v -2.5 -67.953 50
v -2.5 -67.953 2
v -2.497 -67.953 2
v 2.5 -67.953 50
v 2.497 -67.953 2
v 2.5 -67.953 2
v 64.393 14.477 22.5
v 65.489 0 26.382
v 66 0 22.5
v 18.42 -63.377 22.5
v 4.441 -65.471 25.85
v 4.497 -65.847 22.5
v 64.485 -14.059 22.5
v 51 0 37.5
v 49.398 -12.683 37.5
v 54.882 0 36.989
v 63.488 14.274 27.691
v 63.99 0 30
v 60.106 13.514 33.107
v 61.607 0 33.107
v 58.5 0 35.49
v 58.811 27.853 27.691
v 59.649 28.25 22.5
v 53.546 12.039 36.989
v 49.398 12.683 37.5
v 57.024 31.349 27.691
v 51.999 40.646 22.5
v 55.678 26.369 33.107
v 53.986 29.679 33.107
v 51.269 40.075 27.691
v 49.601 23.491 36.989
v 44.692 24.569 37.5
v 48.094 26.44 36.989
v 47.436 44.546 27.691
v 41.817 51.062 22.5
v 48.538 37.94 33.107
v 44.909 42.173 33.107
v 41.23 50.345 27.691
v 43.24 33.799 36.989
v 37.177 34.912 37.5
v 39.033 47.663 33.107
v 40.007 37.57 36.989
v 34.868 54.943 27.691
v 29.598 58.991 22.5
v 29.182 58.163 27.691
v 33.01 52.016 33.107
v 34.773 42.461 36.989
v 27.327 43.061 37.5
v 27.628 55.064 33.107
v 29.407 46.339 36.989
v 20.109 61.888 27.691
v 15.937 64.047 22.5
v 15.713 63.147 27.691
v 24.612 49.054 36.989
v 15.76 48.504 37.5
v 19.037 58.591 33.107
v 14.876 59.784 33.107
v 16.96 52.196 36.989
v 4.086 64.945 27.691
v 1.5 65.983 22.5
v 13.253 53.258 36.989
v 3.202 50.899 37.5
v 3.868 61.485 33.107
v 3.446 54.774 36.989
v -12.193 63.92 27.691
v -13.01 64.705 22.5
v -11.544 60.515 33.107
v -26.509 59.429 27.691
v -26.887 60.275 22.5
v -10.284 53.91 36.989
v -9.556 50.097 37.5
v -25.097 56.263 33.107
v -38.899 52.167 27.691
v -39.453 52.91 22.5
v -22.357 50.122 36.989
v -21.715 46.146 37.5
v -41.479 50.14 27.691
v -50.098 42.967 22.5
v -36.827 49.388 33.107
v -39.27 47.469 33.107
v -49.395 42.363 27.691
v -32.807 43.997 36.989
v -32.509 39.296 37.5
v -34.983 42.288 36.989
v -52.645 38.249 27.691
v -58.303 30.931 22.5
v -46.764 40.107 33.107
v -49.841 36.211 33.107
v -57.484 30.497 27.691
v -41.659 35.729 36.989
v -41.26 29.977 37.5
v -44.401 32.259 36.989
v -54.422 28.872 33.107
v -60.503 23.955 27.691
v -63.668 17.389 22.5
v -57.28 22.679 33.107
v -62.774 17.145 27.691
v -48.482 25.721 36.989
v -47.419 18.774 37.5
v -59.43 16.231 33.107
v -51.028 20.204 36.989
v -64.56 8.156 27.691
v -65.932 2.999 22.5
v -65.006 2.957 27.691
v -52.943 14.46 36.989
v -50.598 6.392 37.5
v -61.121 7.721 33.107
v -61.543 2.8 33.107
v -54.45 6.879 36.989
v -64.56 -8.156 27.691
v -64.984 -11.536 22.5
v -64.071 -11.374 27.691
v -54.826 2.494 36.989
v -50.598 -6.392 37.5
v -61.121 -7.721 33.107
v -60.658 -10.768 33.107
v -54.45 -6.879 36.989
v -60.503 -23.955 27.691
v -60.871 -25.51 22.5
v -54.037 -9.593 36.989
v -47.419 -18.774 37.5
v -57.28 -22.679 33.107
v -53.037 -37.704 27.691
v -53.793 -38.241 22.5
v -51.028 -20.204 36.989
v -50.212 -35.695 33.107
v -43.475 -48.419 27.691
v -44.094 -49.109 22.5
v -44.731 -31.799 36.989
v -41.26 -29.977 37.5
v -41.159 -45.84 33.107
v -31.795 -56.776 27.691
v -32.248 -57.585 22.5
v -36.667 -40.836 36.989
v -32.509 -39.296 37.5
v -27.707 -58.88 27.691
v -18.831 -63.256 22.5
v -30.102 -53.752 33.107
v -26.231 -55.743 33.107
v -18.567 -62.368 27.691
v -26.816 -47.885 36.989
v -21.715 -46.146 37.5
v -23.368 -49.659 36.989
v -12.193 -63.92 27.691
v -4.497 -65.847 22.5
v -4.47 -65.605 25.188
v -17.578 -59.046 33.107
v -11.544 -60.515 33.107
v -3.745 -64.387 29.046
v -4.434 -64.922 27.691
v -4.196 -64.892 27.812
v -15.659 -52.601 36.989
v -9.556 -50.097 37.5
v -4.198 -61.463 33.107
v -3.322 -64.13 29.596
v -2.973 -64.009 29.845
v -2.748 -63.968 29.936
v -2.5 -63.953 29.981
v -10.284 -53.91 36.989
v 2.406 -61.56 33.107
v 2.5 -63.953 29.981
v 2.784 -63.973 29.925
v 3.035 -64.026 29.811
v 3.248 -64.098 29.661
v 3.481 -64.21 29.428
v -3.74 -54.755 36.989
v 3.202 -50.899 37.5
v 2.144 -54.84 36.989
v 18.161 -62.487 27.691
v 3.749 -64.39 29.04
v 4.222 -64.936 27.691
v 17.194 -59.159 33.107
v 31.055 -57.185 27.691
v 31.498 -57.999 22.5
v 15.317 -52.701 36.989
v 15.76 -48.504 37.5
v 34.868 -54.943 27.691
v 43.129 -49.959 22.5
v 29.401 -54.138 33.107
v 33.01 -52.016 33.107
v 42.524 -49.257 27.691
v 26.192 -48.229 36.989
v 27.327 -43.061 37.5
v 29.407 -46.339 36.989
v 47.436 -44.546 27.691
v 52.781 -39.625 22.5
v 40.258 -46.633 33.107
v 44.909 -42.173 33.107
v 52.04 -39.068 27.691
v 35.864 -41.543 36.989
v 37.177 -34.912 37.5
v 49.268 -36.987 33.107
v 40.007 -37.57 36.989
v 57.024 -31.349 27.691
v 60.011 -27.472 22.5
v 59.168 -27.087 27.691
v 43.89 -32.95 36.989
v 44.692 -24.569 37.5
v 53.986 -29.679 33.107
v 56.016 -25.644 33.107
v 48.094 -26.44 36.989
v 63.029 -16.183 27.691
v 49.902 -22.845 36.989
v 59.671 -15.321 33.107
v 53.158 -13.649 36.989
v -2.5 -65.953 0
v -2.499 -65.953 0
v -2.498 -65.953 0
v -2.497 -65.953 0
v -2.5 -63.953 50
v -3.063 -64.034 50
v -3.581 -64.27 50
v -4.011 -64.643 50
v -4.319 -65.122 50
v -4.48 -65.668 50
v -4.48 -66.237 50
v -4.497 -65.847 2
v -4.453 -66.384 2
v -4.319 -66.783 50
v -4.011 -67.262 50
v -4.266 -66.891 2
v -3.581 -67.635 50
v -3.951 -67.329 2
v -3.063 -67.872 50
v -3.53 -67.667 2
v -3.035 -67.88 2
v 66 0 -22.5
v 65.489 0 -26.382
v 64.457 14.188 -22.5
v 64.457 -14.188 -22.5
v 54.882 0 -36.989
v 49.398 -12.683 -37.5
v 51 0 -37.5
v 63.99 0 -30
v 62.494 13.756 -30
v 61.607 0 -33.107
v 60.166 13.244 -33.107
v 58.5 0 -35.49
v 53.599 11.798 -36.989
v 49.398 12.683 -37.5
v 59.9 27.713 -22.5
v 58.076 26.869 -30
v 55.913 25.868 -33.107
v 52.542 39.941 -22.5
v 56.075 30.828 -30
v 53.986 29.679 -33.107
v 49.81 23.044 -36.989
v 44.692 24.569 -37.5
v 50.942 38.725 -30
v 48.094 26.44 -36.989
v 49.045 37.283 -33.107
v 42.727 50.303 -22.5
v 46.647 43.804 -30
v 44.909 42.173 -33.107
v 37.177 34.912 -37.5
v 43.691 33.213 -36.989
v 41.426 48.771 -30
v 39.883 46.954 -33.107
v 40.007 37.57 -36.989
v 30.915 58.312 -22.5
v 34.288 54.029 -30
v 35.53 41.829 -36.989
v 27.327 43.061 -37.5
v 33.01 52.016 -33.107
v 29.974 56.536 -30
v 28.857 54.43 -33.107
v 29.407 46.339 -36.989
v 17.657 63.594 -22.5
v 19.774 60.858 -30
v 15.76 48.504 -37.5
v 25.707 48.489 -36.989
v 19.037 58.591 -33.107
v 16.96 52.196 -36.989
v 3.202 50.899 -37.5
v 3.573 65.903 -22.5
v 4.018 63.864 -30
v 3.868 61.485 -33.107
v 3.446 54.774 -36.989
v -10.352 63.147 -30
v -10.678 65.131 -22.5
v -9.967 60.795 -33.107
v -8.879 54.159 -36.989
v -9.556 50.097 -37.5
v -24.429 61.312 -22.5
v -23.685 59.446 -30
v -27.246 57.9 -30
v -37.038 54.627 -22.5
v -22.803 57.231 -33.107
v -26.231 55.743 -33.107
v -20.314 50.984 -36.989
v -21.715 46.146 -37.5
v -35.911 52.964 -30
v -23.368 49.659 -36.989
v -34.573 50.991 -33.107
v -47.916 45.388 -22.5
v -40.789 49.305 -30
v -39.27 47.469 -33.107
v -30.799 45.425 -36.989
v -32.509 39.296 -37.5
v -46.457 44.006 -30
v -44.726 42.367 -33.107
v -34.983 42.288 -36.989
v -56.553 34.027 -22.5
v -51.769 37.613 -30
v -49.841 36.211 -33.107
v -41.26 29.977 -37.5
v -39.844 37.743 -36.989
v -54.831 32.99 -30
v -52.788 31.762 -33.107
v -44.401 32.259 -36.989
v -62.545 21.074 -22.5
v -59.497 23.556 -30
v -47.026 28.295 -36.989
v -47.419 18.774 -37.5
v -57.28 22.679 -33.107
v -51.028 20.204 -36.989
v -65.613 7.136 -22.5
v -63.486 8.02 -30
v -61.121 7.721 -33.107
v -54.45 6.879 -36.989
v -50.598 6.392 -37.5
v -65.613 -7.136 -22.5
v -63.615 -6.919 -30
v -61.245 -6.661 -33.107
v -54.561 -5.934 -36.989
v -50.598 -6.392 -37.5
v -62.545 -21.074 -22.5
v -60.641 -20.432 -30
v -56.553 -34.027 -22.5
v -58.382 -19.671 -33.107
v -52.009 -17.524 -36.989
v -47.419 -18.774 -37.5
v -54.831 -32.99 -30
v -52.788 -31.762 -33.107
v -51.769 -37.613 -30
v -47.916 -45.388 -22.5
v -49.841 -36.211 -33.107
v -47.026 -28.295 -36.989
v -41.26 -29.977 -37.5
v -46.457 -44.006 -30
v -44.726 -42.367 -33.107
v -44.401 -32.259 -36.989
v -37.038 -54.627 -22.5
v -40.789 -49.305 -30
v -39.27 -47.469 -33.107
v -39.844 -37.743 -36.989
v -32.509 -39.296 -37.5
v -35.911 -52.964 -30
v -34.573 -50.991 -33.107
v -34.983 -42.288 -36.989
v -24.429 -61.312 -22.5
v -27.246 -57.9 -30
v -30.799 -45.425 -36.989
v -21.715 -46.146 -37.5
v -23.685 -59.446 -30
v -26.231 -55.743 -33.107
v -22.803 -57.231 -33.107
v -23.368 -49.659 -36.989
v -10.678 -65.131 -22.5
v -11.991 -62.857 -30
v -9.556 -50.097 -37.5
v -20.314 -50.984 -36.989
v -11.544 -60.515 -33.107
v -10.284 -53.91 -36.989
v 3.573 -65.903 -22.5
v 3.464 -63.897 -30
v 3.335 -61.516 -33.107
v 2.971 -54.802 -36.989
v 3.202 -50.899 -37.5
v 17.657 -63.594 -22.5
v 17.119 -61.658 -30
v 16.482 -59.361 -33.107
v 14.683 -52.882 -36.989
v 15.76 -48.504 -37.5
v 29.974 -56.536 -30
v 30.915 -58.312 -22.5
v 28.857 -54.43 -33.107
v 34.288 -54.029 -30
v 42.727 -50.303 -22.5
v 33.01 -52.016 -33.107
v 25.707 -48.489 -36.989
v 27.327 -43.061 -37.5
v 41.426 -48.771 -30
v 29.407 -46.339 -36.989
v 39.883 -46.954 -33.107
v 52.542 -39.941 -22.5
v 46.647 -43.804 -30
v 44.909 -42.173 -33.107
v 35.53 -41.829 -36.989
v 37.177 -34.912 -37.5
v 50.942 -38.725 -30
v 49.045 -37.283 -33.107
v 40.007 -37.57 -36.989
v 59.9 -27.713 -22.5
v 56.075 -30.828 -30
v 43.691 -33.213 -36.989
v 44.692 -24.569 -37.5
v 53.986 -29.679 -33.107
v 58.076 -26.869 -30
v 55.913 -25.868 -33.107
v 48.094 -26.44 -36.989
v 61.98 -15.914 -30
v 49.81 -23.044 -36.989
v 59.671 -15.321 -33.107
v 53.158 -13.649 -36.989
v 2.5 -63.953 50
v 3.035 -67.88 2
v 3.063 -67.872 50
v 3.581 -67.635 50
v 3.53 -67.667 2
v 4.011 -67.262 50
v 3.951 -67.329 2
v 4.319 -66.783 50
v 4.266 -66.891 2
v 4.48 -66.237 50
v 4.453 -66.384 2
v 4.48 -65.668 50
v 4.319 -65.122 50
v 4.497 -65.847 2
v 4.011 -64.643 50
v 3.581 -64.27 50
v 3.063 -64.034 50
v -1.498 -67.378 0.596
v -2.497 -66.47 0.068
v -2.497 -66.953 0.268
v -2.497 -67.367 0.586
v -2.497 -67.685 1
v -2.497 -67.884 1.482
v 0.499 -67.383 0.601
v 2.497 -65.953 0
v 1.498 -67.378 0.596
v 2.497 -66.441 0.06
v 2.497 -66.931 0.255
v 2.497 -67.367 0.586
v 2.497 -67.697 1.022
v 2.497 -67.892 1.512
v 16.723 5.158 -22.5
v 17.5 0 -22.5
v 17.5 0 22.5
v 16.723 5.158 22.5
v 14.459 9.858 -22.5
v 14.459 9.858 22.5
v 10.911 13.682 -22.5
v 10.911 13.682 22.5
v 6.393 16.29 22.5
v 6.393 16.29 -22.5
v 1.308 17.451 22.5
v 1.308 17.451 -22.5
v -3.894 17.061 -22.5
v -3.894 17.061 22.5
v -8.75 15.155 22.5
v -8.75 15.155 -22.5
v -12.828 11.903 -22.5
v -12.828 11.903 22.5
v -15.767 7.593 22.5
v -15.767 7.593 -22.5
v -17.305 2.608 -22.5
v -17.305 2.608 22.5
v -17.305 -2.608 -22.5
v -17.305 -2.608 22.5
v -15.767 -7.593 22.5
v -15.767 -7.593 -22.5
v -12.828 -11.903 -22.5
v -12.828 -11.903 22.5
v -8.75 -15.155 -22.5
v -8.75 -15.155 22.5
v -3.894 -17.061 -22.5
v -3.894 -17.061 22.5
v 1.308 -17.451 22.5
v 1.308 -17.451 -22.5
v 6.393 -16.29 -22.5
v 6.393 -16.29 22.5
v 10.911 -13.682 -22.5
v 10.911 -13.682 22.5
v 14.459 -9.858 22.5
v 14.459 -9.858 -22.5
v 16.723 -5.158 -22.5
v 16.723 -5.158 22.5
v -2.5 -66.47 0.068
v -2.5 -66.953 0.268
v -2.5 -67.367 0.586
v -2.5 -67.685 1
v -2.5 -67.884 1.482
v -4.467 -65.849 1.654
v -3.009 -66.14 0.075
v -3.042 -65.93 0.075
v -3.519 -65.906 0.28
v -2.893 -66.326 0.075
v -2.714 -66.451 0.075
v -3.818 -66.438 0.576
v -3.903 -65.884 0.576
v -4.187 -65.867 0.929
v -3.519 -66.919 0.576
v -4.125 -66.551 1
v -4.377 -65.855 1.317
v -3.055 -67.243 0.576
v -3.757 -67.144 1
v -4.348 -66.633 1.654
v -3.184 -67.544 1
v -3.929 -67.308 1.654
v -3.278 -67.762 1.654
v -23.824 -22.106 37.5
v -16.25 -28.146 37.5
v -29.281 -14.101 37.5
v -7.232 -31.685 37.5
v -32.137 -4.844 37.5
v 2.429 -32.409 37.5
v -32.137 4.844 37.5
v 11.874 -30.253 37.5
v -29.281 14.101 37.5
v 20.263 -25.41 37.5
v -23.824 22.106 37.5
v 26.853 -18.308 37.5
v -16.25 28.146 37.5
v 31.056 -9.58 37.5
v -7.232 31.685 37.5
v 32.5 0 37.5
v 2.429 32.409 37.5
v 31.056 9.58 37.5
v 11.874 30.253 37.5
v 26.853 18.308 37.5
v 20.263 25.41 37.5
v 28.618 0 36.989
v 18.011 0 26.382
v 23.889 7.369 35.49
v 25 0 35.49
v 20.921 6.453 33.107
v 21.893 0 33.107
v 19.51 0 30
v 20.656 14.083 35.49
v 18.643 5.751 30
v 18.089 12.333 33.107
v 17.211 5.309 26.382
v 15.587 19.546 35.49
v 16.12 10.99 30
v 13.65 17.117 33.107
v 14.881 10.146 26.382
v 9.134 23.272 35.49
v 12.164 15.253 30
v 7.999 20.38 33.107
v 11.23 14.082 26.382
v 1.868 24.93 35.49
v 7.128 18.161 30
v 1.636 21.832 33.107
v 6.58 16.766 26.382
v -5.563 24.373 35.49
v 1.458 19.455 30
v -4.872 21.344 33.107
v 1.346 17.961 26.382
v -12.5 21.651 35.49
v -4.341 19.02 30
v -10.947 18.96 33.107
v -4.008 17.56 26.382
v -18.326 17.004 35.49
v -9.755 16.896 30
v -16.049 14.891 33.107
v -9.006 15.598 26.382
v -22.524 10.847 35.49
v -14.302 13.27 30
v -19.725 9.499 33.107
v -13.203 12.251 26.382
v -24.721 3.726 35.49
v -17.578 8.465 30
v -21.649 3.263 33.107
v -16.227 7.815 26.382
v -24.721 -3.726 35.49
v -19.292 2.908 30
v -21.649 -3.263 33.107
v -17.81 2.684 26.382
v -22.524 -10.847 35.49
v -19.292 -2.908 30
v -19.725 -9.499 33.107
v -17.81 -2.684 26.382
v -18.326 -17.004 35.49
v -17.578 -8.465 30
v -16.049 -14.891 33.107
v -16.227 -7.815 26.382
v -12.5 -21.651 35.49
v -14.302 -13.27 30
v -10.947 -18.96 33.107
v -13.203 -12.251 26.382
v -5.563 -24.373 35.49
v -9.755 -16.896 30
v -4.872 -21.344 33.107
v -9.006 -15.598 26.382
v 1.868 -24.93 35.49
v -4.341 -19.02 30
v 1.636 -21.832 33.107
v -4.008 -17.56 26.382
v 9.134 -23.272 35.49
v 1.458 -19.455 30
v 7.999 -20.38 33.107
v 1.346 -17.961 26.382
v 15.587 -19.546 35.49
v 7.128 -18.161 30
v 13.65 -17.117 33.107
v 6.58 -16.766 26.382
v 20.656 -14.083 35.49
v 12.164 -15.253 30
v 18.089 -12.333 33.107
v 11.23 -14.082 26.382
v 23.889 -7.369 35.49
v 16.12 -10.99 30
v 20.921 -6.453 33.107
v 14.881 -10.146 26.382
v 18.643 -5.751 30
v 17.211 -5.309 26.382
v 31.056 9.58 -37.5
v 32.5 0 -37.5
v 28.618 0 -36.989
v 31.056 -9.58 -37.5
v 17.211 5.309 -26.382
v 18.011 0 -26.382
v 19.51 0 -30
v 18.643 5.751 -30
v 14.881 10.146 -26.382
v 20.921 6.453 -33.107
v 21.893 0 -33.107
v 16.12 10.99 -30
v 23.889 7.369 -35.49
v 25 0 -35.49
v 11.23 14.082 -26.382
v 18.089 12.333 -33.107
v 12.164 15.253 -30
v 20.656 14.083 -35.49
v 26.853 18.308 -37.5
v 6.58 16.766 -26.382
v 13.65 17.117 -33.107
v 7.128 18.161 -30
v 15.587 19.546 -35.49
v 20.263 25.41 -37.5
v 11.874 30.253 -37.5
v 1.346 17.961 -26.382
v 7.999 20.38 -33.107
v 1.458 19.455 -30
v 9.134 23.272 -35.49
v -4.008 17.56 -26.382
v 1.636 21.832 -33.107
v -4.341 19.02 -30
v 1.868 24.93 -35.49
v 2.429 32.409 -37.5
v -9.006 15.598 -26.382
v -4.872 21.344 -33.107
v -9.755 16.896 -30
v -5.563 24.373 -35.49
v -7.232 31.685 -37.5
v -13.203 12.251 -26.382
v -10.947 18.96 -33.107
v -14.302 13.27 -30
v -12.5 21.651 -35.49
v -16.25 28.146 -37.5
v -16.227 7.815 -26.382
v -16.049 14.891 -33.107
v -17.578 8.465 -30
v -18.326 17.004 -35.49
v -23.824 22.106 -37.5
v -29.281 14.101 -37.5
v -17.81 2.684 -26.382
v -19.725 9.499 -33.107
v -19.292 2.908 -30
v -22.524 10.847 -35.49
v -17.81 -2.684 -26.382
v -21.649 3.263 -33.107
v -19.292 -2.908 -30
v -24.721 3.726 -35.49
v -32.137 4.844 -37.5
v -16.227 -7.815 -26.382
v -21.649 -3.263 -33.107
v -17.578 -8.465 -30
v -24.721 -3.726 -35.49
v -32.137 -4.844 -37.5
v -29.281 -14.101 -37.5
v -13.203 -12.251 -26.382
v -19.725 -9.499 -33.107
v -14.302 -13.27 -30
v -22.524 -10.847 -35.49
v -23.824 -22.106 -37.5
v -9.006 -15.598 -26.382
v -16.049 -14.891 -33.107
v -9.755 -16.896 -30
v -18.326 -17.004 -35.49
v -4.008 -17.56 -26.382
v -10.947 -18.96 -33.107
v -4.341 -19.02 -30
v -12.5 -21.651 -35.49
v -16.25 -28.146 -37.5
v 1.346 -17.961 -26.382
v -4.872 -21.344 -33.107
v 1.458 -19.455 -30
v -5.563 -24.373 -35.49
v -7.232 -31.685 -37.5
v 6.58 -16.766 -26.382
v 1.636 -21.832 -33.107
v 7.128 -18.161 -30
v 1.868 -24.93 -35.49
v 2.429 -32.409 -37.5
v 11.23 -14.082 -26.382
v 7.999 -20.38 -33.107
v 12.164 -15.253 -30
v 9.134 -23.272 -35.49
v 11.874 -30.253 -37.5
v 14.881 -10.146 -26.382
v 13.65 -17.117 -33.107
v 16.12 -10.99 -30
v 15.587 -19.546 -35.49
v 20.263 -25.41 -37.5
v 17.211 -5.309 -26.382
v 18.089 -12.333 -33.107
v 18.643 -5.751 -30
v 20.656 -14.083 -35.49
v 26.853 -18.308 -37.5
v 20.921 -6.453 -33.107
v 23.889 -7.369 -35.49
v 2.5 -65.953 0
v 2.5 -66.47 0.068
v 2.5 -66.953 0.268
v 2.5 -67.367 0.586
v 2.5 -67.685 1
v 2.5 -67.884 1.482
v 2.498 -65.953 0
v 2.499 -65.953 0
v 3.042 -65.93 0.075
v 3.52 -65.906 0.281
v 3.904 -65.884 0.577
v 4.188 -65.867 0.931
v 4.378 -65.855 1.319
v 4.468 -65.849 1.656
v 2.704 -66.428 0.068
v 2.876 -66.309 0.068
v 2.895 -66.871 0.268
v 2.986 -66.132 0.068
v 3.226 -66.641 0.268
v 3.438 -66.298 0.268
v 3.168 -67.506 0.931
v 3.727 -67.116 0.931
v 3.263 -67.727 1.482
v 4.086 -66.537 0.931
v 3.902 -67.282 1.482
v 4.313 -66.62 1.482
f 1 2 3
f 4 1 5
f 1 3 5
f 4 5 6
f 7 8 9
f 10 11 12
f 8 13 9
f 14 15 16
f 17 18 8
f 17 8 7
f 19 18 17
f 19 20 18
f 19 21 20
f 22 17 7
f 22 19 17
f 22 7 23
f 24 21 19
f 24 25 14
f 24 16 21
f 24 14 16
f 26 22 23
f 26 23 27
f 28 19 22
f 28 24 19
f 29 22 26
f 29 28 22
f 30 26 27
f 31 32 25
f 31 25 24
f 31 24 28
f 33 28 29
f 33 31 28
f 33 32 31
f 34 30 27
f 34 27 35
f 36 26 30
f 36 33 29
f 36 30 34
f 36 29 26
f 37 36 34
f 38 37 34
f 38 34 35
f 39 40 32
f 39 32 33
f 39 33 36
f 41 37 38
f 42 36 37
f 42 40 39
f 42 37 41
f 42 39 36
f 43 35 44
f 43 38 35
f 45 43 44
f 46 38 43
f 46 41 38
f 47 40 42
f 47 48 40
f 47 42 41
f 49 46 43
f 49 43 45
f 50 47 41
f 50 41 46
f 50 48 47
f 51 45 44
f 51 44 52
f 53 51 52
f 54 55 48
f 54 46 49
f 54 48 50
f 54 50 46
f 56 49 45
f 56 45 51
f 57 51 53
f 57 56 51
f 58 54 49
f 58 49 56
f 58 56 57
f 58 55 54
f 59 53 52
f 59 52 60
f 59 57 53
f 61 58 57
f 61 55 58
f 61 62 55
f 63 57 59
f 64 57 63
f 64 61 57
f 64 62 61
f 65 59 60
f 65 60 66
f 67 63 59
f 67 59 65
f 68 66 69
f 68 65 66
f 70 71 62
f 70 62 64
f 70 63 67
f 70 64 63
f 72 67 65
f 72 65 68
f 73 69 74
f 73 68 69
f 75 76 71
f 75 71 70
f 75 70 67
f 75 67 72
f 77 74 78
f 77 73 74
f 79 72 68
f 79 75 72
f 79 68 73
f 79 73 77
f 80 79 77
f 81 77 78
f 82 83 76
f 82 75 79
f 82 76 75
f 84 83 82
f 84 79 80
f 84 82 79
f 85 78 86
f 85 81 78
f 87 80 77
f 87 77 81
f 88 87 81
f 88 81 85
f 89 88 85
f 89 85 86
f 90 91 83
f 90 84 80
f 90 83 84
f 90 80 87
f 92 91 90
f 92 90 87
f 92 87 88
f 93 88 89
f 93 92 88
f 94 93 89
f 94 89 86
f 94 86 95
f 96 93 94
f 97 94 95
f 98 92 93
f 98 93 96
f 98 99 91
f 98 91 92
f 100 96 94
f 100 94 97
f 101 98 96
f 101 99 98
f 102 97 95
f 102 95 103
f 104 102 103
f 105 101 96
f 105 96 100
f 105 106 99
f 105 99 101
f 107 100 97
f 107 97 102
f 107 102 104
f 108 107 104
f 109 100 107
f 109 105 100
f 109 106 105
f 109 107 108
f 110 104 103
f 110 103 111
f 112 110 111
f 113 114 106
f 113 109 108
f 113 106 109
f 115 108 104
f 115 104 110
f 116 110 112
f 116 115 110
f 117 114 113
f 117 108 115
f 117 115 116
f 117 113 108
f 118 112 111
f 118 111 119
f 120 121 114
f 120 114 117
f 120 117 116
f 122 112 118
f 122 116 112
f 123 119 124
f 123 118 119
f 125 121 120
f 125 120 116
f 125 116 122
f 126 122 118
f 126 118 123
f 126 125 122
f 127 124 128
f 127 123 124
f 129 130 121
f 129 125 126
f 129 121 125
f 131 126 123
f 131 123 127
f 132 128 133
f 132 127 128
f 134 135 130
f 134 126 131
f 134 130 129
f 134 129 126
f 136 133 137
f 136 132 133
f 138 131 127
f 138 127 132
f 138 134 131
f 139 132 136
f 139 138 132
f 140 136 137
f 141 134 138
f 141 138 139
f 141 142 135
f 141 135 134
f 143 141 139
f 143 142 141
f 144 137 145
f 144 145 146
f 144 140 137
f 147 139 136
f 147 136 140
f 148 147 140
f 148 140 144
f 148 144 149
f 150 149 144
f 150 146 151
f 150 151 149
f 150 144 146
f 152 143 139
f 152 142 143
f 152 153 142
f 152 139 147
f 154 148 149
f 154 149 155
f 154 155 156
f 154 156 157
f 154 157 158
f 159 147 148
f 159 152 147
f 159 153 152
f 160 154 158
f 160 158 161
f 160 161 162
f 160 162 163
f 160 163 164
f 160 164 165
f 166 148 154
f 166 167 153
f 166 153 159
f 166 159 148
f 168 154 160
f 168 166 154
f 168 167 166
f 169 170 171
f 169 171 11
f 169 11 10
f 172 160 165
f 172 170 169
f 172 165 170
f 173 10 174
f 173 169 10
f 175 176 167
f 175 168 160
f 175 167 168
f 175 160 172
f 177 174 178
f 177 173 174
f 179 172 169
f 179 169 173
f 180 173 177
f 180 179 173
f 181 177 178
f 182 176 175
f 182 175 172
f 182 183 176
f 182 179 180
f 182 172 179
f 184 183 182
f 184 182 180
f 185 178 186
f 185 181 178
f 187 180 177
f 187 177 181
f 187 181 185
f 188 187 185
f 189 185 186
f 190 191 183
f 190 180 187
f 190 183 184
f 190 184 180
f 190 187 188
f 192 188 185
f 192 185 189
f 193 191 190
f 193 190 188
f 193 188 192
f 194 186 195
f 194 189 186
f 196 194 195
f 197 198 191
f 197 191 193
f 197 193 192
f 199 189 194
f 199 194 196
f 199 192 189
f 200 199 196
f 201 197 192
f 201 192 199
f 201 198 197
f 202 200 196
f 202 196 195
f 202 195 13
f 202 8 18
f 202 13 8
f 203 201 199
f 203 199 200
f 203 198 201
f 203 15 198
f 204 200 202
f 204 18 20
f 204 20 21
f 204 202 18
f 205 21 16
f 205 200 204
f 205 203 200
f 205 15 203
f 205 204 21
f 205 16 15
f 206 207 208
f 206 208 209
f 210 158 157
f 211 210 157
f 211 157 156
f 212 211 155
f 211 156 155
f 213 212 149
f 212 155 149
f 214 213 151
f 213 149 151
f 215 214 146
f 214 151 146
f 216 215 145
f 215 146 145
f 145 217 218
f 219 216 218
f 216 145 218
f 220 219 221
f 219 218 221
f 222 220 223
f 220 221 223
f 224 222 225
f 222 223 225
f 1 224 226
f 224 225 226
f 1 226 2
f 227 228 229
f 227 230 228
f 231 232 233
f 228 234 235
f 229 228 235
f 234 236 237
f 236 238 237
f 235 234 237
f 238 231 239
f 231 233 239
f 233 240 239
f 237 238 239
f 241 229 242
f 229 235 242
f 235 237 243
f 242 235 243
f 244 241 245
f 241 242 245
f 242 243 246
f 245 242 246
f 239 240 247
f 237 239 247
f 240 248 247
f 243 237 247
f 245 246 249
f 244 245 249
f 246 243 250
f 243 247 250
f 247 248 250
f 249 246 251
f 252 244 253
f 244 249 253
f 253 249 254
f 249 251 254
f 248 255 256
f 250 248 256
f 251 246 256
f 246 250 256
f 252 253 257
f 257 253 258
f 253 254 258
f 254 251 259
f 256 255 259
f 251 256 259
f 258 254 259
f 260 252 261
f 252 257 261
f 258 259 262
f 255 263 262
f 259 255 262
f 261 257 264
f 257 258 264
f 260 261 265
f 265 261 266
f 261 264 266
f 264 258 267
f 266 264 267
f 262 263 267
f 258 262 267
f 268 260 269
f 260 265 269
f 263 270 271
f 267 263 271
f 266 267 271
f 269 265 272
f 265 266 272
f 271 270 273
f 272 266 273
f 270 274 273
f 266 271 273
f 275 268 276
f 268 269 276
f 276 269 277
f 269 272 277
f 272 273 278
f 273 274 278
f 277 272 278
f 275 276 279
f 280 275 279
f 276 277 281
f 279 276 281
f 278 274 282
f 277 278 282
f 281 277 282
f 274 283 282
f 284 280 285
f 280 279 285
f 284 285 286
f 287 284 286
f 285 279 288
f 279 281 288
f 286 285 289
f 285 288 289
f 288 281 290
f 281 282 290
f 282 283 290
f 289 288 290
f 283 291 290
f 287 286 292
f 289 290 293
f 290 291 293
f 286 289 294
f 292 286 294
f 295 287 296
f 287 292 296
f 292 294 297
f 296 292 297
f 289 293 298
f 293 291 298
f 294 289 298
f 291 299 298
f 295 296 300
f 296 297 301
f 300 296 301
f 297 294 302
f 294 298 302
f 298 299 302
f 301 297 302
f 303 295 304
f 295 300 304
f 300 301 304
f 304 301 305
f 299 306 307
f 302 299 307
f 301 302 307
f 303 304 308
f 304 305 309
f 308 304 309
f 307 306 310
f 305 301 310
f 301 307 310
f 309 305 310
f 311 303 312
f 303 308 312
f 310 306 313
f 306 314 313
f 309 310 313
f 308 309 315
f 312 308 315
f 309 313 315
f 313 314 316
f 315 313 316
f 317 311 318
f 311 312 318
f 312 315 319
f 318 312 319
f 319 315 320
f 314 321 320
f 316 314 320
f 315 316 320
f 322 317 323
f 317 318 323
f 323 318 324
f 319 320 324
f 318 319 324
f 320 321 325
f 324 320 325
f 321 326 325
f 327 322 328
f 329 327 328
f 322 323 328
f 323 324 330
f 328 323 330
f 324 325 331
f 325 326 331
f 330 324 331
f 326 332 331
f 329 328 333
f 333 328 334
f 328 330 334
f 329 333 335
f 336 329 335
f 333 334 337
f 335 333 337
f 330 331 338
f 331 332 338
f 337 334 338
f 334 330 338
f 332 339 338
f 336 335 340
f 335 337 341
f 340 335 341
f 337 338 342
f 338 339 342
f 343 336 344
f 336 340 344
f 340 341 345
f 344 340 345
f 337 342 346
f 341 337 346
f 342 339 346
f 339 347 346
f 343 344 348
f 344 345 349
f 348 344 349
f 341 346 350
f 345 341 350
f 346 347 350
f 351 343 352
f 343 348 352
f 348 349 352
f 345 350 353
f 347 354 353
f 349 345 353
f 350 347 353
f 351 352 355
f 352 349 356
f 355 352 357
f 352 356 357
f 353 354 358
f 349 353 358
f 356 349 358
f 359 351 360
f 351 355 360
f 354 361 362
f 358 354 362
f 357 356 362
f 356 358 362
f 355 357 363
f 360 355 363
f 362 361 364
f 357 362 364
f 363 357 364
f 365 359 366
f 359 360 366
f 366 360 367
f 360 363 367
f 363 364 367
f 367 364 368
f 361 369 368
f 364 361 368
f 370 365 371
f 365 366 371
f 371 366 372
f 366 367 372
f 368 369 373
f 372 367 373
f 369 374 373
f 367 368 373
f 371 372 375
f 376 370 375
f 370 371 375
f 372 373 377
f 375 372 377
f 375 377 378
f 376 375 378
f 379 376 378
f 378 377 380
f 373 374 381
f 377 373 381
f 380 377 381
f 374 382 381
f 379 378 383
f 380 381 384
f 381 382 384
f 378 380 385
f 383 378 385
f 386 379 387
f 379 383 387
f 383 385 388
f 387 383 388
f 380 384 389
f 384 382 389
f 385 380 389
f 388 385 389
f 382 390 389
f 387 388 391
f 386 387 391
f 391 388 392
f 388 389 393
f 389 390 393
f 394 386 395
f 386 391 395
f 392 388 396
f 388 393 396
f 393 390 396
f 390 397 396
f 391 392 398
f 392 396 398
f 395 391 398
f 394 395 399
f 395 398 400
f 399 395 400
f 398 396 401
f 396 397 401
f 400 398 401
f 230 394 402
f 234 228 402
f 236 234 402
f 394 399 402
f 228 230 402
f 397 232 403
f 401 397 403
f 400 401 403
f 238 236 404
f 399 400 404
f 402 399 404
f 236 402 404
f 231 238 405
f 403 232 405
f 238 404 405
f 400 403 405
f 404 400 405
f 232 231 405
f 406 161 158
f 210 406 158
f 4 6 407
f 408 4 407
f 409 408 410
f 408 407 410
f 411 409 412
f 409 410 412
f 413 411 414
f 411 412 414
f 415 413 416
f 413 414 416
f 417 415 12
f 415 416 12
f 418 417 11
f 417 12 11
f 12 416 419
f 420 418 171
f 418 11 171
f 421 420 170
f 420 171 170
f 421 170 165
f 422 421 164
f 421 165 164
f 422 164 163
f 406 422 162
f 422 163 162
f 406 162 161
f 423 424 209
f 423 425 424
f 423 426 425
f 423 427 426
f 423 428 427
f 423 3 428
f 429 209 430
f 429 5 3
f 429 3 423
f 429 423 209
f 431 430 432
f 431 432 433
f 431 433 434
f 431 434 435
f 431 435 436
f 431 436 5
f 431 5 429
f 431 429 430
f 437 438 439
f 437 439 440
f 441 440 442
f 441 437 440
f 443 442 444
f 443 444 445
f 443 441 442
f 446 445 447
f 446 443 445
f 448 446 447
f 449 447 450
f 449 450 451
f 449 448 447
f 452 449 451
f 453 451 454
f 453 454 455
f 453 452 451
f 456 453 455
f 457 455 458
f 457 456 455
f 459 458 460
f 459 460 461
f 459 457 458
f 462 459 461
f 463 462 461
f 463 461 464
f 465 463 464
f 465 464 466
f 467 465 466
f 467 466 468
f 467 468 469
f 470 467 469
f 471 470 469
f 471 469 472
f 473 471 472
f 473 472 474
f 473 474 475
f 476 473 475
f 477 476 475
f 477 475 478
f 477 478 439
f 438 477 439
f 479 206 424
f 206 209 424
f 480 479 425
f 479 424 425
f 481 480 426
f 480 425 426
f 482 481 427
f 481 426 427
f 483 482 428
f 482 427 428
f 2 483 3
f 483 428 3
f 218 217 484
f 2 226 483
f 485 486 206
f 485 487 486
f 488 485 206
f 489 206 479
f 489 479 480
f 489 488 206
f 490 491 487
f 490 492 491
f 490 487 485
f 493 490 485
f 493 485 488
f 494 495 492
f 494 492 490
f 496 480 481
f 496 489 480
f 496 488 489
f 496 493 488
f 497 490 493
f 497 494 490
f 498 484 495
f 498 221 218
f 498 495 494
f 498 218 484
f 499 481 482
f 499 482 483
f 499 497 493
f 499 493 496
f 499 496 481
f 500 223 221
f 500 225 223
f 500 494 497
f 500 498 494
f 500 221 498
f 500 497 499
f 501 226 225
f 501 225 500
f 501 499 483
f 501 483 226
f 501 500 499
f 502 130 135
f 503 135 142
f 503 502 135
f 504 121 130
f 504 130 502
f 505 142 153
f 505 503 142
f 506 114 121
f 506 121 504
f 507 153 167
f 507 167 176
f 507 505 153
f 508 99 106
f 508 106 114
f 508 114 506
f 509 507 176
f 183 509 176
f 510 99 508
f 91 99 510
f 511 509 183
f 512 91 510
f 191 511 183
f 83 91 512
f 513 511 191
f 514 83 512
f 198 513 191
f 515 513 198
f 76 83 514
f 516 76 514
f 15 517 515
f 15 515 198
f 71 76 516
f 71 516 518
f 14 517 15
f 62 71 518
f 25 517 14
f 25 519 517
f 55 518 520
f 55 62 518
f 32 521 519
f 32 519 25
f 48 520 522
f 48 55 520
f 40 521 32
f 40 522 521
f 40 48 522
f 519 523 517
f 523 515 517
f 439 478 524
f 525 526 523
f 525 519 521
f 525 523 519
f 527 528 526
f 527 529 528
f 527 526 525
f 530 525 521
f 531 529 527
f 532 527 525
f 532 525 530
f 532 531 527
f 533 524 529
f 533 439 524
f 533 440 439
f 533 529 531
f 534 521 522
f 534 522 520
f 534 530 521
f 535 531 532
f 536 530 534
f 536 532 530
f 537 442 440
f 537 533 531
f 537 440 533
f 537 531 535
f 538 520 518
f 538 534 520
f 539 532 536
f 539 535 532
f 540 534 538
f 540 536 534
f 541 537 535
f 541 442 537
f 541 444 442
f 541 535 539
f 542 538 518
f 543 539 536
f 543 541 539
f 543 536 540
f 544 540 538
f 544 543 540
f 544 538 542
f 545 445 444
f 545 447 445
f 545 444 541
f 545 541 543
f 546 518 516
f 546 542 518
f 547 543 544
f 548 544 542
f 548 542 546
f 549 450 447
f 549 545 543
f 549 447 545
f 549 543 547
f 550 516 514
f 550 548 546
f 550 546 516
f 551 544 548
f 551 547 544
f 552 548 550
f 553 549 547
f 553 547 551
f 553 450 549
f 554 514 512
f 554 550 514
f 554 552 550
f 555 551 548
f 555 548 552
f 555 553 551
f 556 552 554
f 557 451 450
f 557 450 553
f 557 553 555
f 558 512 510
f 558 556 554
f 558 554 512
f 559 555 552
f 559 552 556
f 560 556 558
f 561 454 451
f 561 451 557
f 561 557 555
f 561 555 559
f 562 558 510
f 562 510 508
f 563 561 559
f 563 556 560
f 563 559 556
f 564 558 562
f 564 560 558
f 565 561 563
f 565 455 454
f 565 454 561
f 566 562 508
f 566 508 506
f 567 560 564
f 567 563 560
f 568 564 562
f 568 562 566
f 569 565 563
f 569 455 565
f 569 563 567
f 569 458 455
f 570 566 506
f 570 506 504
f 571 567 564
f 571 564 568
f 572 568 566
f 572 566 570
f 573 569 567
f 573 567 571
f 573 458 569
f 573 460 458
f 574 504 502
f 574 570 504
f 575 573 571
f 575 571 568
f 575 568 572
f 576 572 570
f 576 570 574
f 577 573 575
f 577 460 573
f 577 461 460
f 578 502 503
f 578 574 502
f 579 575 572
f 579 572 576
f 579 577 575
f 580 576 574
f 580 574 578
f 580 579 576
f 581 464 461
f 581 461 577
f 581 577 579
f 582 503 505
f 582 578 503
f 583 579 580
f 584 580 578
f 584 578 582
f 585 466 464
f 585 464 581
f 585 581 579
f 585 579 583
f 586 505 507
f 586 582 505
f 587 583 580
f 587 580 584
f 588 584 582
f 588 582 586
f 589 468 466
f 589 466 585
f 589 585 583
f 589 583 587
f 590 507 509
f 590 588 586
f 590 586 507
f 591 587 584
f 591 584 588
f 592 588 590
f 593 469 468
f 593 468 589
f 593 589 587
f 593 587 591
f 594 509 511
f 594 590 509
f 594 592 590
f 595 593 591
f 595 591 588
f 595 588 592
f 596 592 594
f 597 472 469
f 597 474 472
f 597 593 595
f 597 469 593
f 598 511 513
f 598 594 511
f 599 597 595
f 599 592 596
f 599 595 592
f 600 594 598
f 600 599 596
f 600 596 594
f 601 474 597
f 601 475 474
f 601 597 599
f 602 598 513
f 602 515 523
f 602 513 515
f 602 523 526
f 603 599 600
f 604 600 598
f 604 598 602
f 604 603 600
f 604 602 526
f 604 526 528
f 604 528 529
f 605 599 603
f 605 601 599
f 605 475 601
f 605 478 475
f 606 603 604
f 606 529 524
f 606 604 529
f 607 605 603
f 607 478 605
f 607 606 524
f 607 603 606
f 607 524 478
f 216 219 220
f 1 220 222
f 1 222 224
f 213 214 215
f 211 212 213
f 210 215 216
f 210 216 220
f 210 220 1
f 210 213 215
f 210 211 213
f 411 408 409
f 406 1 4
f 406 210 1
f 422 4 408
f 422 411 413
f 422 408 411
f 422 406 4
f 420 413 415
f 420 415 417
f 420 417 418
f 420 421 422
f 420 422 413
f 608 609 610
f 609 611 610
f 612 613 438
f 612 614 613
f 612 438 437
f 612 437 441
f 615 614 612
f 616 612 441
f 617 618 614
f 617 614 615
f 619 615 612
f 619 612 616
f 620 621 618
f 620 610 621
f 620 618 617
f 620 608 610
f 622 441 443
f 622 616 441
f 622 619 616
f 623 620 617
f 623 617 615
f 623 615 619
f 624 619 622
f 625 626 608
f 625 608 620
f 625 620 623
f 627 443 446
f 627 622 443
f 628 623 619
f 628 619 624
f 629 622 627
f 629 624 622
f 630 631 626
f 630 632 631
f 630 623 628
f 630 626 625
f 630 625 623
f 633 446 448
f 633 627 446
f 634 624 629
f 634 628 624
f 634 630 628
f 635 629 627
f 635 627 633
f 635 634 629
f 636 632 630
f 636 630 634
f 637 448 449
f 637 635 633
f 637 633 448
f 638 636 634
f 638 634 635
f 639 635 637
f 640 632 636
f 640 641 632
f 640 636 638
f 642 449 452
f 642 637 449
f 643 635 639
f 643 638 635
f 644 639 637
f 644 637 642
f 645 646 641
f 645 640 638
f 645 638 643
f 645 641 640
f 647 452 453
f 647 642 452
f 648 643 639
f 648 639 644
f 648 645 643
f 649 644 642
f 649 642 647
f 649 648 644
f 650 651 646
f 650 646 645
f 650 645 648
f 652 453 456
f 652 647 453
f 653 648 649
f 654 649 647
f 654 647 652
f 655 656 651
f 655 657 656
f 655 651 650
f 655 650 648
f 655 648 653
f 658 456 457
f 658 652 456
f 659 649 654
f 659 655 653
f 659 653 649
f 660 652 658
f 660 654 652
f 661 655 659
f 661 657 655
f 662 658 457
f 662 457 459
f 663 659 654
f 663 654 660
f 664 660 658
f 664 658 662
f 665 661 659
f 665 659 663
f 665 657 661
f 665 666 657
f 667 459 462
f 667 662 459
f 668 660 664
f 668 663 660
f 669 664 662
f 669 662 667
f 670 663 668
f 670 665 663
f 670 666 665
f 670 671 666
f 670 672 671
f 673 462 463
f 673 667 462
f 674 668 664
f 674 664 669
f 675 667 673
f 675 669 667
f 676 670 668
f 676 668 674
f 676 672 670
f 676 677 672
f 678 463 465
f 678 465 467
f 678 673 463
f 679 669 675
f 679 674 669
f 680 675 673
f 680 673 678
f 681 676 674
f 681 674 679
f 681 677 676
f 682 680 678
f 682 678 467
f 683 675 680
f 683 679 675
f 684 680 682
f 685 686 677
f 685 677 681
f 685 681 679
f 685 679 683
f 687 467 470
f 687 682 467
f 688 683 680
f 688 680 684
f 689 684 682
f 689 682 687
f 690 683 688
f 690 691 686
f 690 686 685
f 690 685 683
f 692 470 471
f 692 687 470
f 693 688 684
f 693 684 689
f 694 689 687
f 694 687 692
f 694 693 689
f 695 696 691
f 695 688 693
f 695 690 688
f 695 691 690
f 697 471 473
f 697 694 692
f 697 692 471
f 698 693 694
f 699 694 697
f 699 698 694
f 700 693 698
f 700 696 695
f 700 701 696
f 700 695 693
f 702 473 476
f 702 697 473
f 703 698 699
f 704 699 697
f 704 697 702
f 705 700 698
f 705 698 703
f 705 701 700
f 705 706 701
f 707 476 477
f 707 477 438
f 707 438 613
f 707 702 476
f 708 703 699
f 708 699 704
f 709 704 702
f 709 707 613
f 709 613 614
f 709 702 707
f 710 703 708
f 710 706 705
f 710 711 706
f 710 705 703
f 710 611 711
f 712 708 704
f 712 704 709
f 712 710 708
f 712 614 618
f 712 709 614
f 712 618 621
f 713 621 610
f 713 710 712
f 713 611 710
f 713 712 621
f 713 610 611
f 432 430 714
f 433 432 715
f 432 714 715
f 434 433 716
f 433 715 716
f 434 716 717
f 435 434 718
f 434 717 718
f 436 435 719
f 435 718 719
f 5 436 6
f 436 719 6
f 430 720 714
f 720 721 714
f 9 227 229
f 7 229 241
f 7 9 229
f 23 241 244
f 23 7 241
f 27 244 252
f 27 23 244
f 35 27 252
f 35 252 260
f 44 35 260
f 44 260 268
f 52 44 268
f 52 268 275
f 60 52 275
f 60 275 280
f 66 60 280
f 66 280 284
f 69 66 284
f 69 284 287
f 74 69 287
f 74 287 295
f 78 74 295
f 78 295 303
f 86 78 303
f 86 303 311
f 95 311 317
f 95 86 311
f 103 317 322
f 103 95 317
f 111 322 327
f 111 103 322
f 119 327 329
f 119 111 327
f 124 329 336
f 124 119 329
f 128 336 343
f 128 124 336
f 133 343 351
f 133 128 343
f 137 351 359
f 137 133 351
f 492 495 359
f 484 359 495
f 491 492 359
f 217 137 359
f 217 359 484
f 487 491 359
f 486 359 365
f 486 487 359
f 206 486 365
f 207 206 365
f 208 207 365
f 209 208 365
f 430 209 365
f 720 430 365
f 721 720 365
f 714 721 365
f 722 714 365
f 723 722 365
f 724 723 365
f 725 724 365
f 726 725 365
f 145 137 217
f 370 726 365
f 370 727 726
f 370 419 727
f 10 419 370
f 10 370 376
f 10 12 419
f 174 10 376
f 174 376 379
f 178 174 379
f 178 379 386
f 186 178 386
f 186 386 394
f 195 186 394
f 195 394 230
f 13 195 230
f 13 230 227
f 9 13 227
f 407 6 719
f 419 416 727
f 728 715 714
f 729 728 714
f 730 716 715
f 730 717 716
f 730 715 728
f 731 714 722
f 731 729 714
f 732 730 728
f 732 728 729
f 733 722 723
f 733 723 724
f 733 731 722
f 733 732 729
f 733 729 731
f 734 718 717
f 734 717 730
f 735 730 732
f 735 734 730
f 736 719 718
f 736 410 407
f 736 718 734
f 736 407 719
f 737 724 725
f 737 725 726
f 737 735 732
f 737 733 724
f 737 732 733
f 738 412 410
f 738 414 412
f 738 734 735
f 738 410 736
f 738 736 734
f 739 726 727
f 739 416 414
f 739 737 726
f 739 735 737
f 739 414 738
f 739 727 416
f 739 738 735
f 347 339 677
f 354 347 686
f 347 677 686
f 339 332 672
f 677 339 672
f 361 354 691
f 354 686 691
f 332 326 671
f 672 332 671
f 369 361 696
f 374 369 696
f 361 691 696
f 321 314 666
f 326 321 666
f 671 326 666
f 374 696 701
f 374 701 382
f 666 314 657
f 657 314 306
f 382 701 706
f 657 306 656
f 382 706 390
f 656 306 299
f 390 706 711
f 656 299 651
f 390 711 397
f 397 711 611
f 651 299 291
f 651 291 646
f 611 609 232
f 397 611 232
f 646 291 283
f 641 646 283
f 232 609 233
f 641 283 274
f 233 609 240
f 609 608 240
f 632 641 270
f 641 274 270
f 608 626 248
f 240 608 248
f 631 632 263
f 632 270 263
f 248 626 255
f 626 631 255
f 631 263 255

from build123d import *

# Parameters (mm, degrees)
F0_R     = 66
F0_R_2   = 17.5
F1_DEPTH = 37.5
F2_R     = 15
F4_DEPTH = 50
F5_R     = 1.9999


# Not quite as in the source:
# - a fillet or chamfer is up to 0.001 mm smaller than in the source, because OpenCascade refuses the exact size


with BuildPart() as f1:
    # F0 (on Top) → F1 (new body, symmetric)
    with BuildSketch(Plane.XY):
        Circle(F0_R)
        Circle(F0_R_2, mode=Mode.SUBTRACT)
    extrude(amount=F1_DEPTH, both=True)

    # F2
    f2_edges = [f1.edges().sort_by_distance(p)[0] for p in [
        (-17.5, 0, 37.5),
        (17.5, 0, 0),
        (-17.5, 0, -37.5),
        (-66, 0, -37.5),
        (66, 0, 0),
        (-66, 0, 37.5),
    ]]
    fillet(f2_edges, radius=F2_R)

    # F3 (on Top) → F4 (join)
    with BuildSketch(Plane.XY):
        with BuildLine():
            Line((2.5, -63.952634519), (-2.5, -63.952634519))
            ThreePointArc((-2.5, -63.952634519), (-4.5, -65.952634519), (-2.5, -67.952634519))
            Line((-2.5, -67.952634519), (2.5, -67.952634519))
            ThreePointArc((2.5, -67.952634519), (4.5, -65.952634519), (2.5, -63.952634519))
        make_face()
    extrude(amount=F4_DEPTH)

    # F5 (radius 2 in the source; OpenCascade refuses exactly that, so slightly less here)
    f5_edges = [f1.edges().sort_by_distance(p)[0] for p in [
        (0, -67.952635, 0),
    ]]
    fillet(f5_edges, radius=F5_R)


solid = f1.part
